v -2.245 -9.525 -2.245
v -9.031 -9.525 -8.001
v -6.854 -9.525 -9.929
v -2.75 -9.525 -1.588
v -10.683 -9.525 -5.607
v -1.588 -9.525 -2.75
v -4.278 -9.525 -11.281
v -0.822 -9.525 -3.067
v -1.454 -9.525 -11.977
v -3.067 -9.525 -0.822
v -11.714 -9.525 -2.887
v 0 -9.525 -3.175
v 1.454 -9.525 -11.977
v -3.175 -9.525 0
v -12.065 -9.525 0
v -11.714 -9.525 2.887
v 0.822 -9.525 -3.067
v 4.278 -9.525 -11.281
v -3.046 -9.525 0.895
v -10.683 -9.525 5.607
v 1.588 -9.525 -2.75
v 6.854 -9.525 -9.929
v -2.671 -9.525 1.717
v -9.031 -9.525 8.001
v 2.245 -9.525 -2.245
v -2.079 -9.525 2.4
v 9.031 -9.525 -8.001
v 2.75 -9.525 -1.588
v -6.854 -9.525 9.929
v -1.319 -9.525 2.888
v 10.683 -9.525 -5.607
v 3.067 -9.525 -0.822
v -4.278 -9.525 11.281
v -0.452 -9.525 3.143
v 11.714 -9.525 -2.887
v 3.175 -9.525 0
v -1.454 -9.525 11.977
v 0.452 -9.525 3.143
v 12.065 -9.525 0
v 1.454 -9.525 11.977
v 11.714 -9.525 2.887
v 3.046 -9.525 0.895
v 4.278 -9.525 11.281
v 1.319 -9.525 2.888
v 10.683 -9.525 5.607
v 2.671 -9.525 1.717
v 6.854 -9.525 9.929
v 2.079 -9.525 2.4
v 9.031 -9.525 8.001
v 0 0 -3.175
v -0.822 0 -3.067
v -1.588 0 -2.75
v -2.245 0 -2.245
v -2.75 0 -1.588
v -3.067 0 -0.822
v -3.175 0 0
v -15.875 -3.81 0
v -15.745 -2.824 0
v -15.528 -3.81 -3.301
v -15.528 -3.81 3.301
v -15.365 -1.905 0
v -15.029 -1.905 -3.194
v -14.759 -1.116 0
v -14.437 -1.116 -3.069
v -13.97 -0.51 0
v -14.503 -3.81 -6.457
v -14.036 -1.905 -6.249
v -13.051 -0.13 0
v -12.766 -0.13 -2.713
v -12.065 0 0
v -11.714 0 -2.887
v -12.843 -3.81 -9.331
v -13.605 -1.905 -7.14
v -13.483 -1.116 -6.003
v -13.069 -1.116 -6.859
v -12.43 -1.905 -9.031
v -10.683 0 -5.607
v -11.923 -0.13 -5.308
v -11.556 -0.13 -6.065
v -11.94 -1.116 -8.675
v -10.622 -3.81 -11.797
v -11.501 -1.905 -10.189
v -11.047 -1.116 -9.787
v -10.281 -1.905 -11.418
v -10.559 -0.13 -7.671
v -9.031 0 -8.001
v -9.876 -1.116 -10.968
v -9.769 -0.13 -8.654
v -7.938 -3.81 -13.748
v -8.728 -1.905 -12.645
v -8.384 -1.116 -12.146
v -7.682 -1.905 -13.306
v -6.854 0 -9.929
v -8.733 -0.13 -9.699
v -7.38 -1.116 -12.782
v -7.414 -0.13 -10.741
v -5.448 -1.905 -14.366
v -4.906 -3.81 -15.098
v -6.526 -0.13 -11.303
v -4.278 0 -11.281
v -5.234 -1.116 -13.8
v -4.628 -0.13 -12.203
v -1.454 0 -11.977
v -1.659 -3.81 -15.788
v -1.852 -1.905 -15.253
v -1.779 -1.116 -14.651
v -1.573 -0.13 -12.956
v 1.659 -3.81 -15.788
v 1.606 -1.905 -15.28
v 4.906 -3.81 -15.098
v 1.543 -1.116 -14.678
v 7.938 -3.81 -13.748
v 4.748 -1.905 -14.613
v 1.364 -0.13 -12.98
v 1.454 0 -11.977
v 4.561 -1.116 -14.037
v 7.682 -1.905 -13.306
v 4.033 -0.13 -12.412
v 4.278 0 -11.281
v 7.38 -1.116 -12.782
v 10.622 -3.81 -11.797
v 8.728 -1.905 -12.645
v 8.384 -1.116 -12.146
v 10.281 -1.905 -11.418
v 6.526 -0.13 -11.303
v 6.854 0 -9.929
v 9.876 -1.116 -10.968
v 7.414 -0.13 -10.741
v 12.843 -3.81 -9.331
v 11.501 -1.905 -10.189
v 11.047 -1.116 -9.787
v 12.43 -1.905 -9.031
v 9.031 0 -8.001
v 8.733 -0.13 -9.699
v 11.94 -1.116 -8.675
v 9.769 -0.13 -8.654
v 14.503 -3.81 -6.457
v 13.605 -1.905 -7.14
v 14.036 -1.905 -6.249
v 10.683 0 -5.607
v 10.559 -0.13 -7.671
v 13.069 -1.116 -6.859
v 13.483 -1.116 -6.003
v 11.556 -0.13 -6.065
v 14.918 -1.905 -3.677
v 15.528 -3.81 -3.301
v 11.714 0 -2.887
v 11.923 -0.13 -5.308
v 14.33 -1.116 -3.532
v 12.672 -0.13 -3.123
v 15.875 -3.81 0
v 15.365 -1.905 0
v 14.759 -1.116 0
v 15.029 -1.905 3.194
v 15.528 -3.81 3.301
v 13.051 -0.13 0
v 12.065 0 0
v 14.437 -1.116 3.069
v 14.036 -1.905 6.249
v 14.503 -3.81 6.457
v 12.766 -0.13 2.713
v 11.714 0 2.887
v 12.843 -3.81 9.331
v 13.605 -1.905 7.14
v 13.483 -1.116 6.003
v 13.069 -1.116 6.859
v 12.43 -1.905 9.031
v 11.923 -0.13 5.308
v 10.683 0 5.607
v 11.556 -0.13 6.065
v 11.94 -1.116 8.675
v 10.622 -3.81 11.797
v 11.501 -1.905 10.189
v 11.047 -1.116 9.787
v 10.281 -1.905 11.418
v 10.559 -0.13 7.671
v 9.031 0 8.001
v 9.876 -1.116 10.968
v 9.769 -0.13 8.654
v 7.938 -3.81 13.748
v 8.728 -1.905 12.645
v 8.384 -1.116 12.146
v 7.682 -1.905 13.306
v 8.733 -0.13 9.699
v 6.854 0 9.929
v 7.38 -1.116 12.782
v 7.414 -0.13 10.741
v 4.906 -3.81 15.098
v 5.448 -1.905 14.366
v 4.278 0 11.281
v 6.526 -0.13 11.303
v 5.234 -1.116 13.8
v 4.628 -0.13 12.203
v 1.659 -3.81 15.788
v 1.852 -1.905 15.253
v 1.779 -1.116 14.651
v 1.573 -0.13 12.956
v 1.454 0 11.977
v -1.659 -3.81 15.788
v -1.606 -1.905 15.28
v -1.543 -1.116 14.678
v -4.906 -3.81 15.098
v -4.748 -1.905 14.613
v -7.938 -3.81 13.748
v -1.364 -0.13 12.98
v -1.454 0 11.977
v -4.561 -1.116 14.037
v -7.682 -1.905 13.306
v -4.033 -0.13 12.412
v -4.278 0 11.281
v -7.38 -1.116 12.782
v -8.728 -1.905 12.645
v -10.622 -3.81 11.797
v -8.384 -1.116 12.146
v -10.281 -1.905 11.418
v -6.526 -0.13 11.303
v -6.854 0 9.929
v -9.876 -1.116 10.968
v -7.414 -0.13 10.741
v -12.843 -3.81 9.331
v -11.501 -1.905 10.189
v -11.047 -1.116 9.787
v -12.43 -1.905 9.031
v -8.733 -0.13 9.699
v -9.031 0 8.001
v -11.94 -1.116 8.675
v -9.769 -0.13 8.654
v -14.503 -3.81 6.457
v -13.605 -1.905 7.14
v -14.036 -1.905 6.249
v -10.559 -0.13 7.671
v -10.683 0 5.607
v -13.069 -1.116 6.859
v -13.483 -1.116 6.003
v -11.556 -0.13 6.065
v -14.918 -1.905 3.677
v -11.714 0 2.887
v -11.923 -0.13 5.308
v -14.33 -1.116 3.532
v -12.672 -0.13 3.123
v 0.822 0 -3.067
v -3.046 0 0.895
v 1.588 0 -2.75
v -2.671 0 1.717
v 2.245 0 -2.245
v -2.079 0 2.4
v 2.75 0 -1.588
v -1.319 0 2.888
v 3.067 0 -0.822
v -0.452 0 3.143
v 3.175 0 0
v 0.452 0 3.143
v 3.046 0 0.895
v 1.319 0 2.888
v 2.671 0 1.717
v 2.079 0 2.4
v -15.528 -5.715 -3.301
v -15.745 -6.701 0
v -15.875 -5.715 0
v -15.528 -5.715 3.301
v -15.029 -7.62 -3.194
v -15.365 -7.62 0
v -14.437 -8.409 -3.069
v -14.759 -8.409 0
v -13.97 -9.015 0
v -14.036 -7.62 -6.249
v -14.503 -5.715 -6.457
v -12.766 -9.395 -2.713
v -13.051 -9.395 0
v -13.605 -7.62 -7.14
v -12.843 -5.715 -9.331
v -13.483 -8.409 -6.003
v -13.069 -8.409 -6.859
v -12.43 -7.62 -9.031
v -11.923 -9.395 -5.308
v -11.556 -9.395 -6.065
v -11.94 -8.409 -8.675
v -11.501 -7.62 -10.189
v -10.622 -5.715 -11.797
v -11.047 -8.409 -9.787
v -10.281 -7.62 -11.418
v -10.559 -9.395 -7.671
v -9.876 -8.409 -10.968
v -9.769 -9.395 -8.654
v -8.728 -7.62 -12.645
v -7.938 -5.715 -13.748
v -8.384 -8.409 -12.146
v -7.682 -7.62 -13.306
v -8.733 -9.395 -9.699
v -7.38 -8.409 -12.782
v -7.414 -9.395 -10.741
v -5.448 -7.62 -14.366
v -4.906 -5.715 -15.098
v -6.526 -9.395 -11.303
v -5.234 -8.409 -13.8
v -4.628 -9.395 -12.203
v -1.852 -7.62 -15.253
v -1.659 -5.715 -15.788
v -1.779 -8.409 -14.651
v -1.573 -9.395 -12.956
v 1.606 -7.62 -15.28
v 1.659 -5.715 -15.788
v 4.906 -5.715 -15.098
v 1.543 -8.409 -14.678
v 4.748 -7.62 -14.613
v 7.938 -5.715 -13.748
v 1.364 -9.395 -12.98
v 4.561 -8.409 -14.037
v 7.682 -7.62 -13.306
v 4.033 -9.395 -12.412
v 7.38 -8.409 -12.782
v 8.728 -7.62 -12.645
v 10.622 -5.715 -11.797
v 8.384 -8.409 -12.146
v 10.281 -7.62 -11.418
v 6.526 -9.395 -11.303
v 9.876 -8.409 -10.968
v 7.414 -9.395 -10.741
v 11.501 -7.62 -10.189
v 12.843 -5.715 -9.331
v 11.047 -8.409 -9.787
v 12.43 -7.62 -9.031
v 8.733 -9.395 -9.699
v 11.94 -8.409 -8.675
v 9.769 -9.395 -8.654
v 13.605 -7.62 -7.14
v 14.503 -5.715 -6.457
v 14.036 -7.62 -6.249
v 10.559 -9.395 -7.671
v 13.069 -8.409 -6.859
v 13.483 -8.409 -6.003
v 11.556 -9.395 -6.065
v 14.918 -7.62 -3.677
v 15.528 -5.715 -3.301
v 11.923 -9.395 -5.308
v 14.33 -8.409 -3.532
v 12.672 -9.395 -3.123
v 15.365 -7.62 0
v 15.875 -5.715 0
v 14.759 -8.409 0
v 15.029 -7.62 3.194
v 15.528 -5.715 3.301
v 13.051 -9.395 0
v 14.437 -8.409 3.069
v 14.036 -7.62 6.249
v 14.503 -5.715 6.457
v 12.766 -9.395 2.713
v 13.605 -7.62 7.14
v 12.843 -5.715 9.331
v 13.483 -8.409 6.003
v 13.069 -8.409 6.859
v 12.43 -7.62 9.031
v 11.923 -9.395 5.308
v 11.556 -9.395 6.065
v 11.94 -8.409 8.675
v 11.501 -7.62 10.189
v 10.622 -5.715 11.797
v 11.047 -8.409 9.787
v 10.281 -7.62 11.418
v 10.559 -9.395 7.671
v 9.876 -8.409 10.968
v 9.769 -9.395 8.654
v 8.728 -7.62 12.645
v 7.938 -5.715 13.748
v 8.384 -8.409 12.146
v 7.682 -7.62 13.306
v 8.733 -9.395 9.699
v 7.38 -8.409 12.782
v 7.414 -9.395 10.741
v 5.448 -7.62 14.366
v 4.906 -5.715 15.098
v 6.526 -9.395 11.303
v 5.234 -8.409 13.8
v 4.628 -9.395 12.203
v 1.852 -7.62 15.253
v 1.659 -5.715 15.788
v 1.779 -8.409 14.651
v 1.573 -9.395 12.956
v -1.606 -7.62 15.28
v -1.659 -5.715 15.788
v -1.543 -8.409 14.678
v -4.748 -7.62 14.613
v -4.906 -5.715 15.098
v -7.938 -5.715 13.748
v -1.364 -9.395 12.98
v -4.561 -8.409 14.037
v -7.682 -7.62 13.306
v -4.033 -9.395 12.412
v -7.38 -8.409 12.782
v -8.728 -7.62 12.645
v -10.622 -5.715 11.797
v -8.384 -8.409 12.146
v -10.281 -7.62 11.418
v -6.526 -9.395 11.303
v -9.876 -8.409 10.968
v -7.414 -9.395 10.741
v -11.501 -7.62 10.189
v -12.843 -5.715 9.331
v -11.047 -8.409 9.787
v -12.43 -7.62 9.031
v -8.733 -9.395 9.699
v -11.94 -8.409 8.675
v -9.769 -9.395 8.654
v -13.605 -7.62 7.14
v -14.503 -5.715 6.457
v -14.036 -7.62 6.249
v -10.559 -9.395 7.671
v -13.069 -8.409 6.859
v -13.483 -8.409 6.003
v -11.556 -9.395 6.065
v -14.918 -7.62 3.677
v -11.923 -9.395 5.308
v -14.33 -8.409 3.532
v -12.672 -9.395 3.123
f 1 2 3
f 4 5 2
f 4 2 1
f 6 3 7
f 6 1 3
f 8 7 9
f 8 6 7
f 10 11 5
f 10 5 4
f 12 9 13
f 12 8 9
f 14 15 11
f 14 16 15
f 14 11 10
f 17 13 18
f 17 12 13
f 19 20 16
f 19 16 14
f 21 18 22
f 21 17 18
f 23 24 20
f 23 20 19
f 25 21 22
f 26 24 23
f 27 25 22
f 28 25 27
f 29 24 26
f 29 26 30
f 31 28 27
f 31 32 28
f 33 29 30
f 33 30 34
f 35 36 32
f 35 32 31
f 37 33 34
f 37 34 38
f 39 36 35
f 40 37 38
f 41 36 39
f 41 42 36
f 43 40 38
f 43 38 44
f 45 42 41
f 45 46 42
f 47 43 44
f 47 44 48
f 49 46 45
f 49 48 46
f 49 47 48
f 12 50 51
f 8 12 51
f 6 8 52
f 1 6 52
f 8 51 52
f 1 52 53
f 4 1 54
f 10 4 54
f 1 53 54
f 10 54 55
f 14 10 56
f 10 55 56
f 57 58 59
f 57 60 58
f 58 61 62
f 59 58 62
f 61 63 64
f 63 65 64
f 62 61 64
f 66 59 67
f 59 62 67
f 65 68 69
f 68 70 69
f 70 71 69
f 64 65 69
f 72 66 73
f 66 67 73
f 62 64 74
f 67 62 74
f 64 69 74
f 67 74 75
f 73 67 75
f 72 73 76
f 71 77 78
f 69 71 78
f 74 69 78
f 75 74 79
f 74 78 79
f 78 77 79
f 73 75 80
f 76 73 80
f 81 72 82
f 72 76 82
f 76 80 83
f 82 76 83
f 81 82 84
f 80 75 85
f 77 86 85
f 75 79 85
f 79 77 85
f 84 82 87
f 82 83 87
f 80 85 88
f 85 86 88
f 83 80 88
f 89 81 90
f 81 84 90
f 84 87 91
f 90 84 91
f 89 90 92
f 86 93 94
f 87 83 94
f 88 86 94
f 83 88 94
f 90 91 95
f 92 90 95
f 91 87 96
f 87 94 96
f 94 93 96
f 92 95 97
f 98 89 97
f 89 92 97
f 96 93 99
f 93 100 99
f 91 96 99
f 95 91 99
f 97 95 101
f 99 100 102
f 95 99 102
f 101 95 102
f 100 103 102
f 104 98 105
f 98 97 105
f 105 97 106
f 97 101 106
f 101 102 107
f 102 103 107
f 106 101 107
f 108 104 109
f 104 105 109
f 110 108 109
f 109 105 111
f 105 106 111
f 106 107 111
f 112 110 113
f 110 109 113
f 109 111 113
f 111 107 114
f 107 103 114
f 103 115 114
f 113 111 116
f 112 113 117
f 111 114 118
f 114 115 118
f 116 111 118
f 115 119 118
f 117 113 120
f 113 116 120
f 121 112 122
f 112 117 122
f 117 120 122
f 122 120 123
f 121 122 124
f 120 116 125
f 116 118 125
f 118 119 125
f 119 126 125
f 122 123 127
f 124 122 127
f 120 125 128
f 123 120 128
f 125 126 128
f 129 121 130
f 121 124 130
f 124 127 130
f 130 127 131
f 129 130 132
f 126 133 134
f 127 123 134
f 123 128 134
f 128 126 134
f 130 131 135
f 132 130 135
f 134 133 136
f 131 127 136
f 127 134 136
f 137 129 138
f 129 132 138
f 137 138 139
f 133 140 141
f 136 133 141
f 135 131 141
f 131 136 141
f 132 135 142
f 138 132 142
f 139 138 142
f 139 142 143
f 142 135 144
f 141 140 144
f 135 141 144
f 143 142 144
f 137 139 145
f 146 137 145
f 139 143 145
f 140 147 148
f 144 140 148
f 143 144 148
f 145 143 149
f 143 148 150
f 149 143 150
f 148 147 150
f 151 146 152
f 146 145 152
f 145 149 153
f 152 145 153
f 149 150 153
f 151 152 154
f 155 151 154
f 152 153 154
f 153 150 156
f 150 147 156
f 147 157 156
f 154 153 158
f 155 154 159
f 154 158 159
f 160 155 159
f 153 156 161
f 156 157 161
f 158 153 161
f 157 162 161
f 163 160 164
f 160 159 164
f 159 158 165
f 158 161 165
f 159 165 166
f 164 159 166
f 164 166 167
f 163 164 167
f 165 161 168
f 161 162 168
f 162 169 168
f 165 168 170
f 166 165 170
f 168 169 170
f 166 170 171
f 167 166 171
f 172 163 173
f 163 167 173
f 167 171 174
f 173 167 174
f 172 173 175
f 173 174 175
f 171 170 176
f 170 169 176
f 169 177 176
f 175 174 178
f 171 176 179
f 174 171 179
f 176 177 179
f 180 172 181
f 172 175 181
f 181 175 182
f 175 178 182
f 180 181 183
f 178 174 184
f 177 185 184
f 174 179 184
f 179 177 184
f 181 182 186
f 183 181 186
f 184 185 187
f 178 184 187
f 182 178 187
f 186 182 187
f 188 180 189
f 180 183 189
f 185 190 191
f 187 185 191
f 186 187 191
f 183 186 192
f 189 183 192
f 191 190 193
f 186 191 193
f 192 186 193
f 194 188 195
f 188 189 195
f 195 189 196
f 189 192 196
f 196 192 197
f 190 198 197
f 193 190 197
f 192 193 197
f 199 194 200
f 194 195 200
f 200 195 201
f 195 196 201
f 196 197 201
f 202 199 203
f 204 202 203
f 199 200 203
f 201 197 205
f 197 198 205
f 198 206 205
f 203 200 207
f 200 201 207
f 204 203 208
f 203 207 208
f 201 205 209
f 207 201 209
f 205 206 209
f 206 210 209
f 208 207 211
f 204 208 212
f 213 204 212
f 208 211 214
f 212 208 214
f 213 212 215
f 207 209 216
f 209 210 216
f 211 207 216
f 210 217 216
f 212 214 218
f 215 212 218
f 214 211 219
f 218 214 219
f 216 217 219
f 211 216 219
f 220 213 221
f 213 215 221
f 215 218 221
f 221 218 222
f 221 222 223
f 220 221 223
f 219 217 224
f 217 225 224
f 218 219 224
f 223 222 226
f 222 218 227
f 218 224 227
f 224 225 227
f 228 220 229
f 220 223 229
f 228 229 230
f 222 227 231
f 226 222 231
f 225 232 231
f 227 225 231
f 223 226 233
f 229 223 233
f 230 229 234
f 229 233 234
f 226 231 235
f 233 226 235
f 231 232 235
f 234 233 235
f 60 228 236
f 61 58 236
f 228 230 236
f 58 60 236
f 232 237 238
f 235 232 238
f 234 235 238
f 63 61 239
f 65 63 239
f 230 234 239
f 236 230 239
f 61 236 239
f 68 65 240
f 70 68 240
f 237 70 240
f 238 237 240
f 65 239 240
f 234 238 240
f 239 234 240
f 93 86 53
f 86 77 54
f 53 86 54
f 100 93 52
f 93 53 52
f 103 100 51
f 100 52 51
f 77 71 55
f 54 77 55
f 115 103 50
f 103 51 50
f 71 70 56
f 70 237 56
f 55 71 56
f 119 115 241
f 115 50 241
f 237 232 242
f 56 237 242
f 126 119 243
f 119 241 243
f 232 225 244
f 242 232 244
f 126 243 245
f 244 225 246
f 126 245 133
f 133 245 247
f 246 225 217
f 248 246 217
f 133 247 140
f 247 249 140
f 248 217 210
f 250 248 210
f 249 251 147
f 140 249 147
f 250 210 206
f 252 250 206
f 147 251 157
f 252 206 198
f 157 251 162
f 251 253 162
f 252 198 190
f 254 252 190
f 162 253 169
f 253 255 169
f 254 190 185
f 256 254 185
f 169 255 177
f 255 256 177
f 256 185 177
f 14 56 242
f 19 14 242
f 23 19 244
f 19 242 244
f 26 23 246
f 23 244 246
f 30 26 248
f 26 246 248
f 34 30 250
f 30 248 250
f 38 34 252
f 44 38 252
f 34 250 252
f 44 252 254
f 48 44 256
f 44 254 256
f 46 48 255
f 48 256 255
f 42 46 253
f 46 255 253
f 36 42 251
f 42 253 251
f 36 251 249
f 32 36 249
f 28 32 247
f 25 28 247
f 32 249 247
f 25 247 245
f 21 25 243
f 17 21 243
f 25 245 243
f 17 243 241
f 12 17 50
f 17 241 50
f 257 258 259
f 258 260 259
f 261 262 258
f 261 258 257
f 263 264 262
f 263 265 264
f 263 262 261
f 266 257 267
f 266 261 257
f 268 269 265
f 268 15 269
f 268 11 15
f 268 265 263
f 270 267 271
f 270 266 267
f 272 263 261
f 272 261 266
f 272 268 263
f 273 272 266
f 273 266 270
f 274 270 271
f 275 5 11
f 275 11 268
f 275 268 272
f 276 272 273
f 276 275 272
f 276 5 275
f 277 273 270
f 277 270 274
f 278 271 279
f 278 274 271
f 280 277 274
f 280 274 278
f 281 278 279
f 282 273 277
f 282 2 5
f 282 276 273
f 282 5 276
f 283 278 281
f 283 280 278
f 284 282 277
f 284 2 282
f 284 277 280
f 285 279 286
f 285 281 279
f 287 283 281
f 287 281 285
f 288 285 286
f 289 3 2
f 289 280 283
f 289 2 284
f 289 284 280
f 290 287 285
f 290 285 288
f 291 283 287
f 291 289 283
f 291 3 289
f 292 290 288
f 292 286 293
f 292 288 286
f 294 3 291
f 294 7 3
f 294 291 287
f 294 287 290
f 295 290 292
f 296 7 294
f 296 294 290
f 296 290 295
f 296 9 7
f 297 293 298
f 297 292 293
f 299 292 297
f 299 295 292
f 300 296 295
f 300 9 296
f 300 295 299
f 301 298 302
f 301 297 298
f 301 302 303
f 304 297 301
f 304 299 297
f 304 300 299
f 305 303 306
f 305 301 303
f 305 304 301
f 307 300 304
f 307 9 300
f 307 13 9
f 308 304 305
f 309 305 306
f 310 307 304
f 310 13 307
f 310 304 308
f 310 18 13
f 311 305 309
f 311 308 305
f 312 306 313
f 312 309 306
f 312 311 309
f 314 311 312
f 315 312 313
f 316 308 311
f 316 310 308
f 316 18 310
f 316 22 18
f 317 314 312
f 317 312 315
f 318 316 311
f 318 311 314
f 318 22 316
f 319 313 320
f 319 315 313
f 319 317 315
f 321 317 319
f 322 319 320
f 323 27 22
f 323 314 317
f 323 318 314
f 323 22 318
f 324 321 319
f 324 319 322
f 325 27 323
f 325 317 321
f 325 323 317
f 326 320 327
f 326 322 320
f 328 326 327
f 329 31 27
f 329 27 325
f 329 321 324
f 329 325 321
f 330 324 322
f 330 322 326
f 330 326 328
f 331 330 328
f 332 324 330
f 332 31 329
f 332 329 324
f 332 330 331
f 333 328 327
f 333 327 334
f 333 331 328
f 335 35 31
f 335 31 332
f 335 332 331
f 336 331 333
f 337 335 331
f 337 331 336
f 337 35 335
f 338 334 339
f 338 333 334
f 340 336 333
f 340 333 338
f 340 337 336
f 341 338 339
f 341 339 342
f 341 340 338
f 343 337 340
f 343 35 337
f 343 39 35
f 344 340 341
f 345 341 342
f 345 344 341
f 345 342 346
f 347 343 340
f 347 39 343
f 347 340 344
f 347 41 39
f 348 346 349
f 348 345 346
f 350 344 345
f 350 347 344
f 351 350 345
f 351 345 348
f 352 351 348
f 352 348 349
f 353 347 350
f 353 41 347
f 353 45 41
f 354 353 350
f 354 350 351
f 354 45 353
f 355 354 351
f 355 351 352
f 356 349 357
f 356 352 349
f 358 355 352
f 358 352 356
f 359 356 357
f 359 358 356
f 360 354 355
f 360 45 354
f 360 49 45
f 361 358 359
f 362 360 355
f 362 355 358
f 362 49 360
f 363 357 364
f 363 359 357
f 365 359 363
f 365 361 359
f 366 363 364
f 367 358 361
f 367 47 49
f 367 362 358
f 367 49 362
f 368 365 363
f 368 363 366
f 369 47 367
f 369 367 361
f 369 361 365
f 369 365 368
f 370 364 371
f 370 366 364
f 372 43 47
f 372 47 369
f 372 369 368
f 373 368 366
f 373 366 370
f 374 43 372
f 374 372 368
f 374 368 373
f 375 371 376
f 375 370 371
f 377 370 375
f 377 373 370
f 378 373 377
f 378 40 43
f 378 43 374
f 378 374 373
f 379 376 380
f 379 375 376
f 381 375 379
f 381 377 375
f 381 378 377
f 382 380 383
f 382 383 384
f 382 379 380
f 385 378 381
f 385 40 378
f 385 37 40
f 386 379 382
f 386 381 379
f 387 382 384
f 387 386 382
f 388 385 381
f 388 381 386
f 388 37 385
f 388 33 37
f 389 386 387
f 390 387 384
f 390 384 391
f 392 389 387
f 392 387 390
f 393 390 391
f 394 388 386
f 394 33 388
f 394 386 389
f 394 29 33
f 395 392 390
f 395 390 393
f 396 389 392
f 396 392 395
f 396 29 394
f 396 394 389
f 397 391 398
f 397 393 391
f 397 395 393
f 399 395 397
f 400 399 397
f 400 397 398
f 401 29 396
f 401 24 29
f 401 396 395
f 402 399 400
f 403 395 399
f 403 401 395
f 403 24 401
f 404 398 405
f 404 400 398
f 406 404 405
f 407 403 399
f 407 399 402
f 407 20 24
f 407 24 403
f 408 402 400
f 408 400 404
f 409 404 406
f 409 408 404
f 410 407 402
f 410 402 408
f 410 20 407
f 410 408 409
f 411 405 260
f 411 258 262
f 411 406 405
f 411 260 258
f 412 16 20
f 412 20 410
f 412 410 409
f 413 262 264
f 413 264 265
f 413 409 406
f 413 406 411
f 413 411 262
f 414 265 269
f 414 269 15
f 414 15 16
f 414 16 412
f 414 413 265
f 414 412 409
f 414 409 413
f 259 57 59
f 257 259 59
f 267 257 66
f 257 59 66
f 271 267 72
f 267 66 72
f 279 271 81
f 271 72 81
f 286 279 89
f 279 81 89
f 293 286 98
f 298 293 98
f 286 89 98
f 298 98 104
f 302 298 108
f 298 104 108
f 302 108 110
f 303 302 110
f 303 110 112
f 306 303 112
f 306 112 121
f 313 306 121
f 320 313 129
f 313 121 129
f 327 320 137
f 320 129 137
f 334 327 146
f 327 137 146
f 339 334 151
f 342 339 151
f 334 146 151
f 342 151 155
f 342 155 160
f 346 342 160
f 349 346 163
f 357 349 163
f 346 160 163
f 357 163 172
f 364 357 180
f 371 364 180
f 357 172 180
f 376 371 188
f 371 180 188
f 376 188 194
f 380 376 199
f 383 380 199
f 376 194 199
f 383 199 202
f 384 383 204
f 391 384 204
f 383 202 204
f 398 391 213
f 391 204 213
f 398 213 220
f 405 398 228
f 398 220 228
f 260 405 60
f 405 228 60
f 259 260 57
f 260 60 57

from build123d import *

# Parameters (mm, degrees)
F1_DEPTH = 9.525
F2_R     = 3.81


with BuildPart() as f1:
    # F0 (on Front) → F1 (new body)
    with BuildSketch(Plane.XZ):
        with BuildLine():
            ThreePointArc((15.875, 0), (0, 15.875), (-15.875, 0))
            ThreePointArc((-15.875, 0), (0, -15.875), (15.875, 0))
        make_face()
        with BuildLine():
            ThreePointArc((0, -3.175), (-2.2450640303, -2.2450640303), (-3.175, 0))
            ThreePointArc((-3.175, 0), (0, 3.175), (3.175, 0))
            ThreePointArc((3.175, 0), (2.2450640303, -2.2450640303), (0, -3.175))
        make_face(mode=Mode.SUBTRACT)
    extrude(amount=F1_DEPTH)

    # F2
    f2_edges = [f1.edges().sort_by_distance(p)[0] for p in [
        (15.875, -9.525, 0),
        (15.875, 0, 0),
    ]]
    fillet(f2_edges, radius=F2_R)


solid = f1.part
